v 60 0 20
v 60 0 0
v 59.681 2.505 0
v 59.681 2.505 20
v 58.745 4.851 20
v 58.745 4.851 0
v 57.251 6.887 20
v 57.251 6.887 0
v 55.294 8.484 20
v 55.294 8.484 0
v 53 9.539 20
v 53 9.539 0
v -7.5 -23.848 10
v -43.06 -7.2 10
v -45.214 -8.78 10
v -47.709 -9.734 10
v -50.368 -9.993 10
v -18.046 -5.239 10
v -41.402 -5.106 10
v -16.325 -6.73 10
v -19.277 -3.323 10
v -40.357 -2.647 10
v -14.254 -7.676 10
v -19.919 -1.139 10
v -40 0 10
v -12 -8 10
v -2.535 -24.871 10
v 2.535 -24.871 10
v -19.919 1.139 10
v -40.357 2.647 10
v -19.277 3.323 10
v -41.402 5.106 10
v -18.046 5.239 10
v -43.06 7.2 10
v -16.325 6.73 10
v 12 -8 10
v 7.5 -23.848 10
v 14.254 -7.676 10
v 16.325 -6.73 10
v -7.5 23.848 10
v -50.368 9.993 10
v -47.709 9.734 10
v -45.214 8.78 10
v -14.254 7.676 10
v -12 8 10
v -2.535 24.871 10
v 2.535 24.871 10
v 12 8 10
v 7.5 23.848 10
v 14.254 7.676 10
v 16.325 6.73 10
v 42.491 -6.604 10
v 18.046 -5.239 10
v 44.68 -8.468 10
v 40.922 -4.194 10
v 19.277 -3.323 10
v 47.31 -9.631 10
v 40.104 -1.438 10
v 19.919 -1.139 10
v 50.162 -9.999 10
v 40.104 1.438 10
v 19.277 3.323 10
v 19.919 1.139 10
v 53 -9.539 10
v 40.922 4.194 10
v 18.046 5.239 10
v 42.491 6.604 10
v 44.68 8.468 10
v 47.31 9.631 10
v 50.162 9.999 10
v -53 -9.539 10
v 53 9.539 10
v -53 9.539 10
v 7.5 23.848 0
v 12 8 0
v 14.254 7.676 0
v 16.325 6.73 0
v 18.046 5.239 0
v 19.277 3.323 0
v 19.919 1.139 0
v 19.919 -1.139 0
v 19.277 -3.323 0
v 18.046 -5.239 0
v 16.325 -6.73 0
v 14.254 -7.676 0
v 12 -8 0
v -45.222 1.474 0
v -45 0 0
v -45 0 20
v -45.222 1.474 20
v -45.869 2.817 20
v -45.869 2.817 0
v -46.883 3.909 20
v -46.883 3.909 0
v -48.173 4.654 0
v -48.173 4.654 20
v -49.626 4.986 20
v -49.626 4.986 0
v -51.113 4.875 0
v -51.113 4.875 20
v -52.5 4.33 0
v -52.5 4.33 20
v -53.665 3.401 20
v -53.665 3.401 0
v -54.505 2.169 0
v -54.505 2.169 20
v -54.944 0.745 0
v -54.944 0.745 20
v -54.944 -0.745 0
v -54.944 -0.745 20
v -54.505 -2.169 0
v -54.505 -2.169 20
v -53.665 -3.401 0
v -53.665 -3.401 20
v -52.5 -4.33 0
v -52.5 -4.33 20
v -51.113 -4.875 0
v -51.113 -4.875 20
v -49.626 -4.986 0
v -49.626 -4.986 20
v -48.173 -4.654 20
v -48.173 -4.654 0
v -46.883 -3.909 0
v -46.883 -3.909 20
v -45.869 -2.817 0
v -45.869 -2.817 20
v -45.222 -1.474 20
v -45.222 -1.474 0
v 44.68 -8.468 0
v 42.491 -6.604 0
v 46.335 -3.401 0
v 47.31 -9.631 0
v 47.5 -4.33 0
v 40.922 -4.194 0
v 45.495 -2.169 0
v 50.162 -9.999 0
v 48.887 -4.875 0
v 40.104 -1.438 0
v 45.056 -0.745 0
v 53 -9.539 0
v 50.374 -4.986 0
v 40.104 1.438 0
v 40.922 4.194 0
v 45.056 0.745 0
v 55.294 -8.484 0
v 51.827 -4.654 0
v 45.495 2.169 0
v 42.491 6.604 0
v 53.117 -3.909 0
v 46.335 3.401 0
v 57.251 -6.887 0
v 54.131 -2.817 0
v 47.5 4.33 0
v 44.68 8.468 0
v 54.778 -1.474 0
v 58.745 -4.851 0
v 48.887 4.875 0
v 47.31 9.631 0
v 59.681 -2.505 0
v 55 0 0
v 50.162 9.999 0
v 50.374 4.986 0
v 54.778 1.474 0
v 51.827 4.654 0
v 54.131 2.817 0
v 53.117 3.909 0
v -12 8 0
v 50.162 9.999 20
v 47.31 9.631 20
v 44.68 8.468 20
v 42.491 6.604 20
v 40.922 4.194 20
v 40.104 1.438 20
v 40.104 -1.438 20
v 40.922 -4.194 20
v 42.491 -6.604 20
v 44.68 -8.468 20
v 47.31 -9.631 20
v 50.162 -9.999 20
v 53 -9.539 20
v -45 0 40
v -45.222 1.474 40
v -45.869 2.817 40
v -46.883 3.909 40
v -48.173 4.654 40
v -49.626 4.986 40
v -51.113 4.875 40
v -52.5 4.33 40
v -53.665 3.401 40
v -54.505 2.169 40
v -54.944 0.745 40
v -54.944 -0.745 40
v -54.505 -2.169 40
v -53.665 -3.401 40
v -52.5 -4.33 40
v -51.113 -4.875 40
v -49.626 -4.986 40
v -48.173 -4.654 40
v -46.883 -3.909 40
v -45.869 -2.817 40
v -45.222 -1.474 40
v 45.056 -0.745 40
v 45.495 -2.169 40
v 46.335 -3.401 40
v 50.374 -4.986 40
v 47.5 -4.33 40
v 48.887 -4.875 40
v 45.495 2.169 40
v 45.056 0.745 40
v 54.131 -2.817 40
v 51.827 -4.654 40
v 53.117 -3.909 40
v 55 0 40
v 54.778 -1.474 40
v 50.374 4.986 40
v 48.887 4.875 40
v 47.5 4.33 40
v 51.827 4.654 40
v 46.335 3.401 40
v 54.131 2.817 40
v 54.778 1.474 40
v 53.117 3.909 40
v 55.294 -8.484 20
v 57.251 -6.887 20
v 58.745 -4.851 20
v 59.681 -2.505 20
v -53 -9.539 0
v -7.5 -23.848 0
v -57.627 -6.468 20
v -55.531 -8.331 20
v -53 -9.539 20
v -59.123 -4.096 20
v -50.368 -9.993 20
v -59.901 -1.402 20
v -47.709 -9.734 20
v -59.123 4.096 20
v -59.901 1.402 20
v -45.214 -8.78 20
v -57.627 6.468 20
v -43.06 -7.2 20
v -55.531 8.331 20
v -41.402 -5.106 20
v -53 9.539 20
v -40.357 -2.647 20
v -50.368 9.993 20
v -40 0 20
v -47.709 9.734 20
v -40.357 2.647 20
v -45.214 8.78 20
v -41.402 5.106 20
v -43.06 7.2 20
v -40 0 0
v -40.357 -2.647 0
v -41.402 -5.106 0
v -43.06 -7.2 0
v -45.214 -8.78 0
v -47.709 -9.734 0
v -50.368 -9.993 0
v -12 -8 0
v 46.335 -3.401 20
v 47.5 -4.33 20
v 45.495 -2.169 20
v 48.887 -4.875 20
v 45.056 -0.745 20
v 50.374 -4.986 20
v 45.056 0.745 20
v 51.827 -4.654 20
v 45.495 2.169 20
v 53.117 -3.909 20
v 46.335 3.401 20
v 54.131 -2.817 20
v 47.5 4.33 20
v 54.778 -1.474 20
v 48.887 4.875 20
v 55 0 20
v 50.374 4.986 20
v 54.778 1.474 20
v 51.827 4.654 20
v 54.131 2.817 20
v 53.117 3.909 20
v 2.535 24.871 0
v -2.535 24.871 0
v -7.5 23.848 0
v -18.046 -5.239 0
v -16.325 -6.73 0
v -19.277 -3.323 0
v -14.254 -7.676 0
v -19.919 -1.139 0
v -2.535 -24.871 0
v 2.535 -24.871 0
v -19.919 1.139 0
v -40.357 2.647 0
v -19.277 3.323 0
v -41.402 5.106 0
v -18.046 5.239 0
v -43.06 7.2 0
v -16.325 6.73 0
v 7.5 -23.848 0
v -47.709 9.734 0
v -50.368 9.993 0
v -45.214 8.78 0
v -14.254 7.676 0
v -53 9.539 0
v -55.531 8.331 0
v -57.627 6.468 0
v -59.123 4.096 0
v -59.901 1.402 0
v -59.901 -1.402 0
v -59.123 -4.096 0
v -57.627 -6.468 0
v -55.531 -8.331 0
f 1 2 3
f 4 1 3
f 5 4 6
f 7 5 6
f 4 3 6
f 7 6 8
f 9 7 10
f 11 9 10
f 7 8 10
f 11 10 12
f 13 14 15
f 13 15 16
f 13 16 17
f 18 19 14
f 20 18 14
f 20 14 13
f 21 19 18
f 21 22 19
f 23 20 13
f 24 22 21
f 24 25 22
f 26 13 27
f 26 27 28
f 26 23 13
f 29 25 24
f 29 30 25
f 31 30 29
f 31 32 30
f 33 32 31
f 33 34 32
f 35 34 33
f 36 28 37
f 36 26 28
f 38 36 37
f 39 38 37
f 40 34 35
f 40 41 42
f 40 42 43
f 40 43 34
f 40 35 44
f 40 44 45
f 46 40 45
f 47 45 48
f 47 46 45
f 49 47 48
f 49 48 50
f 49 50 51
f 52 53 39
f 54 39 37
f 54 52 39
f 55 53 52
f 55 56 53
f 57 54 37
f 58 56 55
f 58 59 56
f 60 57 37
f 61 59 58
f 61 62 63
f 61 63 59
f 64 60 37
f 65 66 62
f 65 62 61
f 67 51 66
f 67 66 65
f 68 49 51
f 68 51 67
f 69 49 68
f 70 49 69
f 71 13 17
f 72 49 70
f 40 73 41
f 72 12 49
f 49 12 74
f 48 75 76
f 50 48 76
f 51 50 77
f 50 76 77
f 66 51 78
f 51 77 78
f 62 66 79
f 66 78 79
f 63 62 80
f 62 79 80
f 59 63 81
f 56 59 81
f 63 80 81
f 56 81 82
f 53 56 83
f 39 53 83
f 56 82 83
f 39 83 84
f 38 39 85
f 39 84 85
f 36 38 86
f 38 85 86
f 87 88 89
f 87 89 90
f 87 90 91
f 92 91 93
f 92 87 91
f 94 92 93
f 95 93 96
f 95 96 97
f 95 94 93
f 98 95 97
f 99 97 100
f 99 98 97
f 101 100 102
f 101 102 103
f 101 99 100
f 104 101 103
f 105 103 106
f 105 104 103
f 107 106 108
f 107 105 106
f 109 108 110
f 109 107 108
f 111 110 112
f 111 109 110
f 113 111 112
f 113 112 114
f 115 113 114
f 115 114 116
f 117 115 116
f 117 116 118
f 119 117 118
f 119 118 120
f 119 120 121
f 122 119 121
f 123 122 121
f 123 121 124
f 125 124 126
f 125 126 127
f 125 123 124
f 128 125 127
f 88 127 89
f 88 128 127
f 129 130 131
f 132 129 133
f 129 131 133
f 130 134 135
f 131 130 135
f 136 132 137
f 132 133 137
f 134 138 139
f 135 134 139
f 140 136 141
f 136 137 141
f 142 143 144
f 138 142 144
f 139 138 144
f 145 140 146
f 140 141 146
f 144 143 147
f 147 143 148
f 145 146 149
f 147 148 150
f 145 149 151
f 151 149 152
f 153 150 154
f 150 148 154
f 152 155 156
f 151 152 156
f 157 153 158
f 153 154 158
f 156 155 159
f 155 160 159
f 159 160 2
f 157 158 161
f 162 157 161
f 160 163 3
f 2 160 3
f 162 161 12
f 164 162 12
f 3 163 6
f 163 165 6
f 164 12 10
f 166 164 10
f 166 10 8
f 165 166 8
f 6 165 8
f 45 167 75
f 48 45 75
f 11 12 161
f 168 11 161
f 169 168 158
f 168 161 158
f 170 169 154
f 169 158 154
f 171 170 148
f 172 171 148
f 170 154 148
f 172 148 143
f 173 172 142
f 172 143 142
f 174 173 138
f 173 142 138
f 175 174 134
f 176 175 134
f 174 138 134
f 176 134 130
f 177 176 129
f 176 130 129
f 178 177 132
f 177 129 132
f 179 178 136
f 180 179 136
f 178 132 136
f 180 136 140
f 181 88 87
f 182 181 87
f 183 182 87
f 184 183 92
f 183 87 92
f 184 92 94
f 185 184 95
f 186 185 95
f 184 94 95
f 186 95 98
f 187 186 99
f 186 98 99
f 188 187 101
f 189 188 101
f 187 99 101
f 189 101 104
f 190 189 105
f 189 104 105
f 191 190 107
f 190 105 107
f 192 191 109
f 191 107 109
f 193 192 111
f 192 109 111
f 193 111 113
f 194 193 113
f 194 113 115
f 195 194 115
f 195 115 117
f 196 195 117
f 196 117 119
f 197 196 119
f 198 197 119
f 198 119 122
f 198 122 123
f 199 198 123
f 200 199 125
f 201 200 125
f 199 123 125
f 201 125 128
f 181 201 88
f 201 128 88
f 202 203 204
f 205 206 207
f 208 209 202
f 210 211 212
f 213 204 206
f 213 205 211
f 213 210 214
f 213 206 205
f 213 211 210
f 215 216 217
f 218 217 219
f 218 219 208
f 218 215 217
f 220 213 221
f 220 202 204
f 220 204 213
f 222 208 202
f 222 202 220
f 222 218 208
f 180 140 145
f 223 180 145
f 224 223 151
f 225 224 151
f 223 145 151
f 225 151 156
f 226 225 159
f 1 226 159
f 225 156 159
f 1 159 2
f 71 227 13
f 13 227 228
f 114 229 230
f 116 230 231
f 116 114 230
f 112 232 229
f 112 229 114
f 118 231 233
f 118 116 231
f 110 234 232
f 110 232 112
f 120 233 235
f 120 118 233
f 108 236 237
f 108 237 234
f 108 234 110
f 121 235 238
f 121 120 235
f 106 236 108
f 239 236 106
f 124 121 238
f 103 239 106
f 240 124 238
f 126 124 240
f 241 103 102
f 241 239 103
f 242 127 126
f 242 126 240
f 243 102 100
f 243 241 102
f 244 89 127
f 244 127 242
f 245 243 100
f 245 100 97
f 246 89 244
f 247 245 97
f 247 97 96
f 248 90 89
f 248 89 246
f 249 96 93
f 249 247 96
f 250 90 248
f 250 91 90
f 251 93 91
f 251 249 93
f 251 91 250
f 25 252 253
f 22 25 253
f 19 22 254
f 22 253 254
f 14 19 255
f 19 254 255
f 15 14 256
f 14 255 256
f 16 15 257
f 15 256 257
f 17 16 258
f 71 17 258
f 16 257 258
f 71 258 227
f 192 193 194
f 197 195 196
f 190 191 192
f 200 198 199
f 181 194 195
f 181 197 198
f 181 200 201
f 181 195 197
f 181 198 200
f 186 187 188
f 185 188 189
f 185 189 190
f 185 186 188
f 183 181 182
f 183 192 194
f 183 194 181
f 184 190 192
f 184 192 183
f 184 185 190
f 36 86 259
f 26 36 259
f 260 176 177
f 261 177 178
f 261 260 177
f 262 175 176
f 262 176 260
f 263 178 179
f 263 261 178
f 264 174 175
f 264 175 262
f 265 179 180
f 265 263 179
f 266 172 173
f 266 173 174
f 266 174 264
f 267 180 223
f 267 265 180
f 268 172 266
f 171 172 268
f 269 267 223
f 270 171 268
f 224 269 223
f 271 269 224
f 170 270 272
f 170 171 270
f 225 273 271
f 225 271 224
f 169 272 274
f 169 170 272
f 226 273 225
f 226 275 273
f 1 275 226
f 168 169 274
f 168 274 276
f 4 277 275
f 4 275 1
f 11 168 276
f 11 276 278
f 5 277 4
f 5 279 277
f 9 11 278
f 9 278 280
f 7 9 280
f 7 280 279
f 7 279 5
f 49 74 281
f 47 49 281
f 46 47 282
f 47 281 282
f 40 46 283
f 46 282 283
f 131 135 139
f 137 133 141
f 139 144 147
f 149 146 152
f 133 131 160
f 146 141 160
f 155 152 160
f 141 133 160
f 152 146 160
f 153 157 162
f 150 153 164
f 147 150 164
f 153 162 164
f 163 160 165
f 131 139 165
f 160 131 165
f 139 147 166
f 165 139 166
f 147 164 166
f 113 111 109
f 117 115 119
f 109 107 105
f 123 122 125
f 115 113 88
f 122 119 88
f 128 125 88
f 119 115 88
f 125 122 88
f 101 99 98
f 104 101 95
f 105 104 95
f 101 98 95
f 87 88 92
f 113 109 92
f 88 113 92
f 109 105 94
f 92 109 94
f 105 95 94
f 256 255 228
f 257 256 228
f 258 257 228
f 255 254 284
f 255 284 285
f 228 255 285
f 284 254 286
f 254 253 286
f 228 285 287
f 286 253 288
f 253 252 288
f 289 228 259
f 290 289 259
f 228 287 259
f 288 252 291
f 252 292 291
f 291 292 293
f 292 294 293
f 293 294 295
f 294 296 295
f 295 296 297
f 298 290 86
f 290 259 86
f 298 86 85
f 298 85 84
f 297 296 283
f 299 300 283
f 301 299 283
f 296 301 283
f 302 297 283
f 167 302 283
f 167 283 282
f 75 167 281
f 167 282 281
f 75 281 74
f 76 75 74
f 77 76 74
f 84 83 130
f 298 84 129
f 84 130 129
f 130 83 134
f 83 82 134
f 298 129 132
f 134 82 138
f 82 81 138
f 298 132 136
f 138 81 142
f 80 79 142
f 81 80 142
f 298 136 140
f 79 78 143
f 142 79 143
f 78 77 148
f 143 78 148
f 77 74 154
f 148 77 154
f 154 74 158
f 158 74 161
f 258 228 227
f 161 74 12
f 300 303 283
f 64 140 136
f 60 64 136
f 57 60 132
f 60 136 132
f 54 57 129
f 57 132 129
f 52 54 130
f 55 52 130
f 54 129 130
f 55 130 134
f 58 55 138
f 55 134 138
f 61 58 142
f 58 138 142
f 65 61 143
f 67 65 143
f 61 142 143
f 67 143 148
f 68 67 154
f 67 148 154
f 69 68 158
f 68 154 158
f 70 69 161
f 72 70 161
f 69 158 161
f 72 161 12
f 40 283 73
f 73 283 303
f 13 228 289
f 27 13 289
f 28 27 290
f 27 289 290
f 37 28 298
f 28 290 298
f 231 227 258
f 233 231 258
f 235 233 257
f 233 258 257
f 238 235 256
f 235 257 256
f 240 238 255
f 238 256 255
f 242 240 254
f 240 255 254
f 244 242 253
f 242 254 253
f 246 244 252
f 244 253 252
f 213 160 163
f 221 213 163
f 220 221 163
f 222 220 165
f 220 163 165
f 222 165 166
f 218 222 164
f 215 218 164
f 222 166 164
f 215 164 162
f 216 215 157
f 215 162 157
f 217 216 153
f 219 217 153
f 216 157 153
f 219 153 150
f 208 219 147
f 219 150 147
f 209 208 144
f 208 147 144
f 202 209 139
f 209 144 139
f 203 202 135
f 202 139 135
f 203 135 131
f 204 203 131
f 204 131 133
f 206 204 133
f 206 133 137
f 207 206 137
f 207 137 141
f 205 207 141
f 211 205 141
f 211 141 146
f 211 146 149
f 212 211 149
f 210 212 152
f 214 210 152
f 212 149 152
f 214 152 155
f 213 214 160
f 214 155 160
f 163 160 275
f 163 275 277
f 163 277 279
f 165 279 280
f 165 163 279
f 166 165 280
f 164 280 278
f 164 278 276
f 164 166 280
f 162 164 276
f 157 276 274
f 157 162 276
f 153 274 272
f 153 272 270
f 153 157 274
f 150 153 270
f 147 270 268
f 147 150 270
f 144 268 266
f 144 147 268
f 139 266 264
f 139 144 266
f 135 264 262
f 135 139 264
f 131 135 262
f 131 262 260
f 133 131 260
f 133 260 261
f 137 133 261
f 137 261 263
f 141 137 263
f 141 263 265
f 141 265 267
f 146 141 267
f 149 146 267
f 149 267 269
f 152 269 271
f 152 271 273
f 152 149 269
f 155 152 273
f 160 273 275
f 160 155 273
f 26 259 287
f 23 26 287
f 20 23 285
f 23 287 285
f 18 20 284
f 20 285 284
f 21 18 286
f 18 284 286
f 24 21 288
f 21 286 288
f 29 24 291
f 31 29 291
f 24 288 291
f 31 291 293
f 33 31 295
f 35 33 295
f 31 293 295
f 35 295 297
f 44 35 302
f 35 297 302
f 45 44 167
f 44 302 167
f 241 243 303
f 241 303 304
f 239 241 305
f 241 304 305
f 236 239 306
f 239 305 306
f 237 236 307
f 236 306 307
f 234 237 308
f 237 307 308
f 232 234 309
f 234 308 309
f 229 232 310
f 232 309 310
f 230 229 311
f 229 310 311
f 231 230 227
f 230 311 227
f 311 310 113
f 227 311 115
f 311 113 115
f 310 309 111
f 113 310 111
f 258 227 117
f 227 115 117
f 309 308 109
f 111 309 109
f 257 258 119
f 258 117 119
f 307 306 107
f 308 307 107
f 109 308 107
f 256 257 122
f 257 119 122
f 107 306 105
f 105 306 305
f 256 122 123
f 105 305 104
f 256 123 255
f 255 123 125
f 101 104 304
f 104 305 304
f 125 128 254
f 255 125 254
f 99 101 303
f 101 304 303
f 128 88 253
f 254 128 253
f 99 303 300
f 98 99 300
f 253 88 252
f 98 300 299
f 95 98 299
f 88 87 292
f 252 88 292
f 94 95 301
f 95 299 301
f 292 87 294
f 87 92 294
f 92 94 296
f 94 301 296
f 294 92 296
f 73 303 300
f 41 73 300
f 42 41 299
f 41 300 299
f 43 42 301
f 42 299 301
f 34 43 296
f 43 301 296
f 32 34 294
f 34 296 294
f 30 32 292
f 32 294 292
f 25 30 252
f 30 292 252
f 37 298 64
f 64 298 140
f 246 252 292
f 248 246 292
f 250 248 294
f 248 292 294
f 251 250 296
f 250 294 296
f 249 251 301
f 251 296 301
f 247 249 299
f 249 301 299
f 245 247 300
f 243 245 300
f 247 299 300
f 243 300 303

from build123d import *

# Parameters (mm, degrees)
F0_R     = 5
F1_DEPTH = 20
F2_DEPTH = 40
F3_DEPTH = 10


with BuildPart() as f1:
    # F0 (on Top) → F1 (new body)
    with BuildSketch(Plane.XY):
        with BuildLine():
            ThreePointArc((-53, 9.539392), (-60, 0), (-53, -9.539392))
            ThreePointArc((-53, -9.539392), (-44.08392, -8.062258), (-40, 0))
            ThreePointArc((-40, 0), (-44.08392, 8.062258), (-53, 9.539392))
        make_face()
        with Locations((-50, 0)):
            Circle(F0_R, mode=Mode.SUBTRACT)
        with BuildLine():
            ThreePointArc((53, 9.539392), (40, 0), (53, -9.539392))
            ThreePointArc((53, -9.539392), (58.062258, -5.91608), (60, 0))
            ThreePointArc((60, 0), (58.062258, 5.91608), (53, 9.539392))
        make_face()
        with Locations((50, 0)):
            Circle(F0_R, mode=Mode.SUBTRACT)
    extrude(amount=F1_DEPTH)


with BuildPart() as f2:
    # F0 (on Top) → F2 (new body)
    with BuildSketch(Plane.XY):
        with Locations((-50, 0)):
            Circle(F0_R)
        with Locations((50, 0)):
            Circle(F0_R)
    extrude(amount=F2_DEPTH)


with BuildPart() as f3:
    # F0 (on Top) → F3 (new body)
    with BuildSketch(Plane.XY):
        with BuildLine():
            Line((-53, -9.539392), (-7.5, -23.84848))
            ThreePointArc((-7.5, -23.84848), (0, -25), (7.5, -23.84848))
            Line((7.5, -23.84848), (53, -9.539392))
            ThreePointArc((53, -9.539392), (40, 0), (53, 9.539392))
            Line((53, 9.539392), (7.5, 23.84848))
            ThreePointArc((7.5, 23.84848), (0, 25), (-7.5, 23.84848))
            Line((-7.5, 23.84848), (-53, 9.539392))
            ThreePointArc((-53, 9.539392), (-44.08392, 8.062258), (-40, 0))
            ThreePointArc((-40, 0), (-44.08392, -8.062258), (-53, -9.539392))
        make_face()
        with BuildLine():
            ThreePointArc((-12, -8), (-20, 0), (-12, 8))
            Line((-12, 8), (12, 8))
            ThreePointArc((12, 8), (20, 0), (12, -8))
            Line((12, -8), (-12, -8))
        make_face(mode=Mode.SUBTRACT)
    extrude(amount=F3_DEPTH)


solid = Compound([f1.part, f2.part, f3.part])
